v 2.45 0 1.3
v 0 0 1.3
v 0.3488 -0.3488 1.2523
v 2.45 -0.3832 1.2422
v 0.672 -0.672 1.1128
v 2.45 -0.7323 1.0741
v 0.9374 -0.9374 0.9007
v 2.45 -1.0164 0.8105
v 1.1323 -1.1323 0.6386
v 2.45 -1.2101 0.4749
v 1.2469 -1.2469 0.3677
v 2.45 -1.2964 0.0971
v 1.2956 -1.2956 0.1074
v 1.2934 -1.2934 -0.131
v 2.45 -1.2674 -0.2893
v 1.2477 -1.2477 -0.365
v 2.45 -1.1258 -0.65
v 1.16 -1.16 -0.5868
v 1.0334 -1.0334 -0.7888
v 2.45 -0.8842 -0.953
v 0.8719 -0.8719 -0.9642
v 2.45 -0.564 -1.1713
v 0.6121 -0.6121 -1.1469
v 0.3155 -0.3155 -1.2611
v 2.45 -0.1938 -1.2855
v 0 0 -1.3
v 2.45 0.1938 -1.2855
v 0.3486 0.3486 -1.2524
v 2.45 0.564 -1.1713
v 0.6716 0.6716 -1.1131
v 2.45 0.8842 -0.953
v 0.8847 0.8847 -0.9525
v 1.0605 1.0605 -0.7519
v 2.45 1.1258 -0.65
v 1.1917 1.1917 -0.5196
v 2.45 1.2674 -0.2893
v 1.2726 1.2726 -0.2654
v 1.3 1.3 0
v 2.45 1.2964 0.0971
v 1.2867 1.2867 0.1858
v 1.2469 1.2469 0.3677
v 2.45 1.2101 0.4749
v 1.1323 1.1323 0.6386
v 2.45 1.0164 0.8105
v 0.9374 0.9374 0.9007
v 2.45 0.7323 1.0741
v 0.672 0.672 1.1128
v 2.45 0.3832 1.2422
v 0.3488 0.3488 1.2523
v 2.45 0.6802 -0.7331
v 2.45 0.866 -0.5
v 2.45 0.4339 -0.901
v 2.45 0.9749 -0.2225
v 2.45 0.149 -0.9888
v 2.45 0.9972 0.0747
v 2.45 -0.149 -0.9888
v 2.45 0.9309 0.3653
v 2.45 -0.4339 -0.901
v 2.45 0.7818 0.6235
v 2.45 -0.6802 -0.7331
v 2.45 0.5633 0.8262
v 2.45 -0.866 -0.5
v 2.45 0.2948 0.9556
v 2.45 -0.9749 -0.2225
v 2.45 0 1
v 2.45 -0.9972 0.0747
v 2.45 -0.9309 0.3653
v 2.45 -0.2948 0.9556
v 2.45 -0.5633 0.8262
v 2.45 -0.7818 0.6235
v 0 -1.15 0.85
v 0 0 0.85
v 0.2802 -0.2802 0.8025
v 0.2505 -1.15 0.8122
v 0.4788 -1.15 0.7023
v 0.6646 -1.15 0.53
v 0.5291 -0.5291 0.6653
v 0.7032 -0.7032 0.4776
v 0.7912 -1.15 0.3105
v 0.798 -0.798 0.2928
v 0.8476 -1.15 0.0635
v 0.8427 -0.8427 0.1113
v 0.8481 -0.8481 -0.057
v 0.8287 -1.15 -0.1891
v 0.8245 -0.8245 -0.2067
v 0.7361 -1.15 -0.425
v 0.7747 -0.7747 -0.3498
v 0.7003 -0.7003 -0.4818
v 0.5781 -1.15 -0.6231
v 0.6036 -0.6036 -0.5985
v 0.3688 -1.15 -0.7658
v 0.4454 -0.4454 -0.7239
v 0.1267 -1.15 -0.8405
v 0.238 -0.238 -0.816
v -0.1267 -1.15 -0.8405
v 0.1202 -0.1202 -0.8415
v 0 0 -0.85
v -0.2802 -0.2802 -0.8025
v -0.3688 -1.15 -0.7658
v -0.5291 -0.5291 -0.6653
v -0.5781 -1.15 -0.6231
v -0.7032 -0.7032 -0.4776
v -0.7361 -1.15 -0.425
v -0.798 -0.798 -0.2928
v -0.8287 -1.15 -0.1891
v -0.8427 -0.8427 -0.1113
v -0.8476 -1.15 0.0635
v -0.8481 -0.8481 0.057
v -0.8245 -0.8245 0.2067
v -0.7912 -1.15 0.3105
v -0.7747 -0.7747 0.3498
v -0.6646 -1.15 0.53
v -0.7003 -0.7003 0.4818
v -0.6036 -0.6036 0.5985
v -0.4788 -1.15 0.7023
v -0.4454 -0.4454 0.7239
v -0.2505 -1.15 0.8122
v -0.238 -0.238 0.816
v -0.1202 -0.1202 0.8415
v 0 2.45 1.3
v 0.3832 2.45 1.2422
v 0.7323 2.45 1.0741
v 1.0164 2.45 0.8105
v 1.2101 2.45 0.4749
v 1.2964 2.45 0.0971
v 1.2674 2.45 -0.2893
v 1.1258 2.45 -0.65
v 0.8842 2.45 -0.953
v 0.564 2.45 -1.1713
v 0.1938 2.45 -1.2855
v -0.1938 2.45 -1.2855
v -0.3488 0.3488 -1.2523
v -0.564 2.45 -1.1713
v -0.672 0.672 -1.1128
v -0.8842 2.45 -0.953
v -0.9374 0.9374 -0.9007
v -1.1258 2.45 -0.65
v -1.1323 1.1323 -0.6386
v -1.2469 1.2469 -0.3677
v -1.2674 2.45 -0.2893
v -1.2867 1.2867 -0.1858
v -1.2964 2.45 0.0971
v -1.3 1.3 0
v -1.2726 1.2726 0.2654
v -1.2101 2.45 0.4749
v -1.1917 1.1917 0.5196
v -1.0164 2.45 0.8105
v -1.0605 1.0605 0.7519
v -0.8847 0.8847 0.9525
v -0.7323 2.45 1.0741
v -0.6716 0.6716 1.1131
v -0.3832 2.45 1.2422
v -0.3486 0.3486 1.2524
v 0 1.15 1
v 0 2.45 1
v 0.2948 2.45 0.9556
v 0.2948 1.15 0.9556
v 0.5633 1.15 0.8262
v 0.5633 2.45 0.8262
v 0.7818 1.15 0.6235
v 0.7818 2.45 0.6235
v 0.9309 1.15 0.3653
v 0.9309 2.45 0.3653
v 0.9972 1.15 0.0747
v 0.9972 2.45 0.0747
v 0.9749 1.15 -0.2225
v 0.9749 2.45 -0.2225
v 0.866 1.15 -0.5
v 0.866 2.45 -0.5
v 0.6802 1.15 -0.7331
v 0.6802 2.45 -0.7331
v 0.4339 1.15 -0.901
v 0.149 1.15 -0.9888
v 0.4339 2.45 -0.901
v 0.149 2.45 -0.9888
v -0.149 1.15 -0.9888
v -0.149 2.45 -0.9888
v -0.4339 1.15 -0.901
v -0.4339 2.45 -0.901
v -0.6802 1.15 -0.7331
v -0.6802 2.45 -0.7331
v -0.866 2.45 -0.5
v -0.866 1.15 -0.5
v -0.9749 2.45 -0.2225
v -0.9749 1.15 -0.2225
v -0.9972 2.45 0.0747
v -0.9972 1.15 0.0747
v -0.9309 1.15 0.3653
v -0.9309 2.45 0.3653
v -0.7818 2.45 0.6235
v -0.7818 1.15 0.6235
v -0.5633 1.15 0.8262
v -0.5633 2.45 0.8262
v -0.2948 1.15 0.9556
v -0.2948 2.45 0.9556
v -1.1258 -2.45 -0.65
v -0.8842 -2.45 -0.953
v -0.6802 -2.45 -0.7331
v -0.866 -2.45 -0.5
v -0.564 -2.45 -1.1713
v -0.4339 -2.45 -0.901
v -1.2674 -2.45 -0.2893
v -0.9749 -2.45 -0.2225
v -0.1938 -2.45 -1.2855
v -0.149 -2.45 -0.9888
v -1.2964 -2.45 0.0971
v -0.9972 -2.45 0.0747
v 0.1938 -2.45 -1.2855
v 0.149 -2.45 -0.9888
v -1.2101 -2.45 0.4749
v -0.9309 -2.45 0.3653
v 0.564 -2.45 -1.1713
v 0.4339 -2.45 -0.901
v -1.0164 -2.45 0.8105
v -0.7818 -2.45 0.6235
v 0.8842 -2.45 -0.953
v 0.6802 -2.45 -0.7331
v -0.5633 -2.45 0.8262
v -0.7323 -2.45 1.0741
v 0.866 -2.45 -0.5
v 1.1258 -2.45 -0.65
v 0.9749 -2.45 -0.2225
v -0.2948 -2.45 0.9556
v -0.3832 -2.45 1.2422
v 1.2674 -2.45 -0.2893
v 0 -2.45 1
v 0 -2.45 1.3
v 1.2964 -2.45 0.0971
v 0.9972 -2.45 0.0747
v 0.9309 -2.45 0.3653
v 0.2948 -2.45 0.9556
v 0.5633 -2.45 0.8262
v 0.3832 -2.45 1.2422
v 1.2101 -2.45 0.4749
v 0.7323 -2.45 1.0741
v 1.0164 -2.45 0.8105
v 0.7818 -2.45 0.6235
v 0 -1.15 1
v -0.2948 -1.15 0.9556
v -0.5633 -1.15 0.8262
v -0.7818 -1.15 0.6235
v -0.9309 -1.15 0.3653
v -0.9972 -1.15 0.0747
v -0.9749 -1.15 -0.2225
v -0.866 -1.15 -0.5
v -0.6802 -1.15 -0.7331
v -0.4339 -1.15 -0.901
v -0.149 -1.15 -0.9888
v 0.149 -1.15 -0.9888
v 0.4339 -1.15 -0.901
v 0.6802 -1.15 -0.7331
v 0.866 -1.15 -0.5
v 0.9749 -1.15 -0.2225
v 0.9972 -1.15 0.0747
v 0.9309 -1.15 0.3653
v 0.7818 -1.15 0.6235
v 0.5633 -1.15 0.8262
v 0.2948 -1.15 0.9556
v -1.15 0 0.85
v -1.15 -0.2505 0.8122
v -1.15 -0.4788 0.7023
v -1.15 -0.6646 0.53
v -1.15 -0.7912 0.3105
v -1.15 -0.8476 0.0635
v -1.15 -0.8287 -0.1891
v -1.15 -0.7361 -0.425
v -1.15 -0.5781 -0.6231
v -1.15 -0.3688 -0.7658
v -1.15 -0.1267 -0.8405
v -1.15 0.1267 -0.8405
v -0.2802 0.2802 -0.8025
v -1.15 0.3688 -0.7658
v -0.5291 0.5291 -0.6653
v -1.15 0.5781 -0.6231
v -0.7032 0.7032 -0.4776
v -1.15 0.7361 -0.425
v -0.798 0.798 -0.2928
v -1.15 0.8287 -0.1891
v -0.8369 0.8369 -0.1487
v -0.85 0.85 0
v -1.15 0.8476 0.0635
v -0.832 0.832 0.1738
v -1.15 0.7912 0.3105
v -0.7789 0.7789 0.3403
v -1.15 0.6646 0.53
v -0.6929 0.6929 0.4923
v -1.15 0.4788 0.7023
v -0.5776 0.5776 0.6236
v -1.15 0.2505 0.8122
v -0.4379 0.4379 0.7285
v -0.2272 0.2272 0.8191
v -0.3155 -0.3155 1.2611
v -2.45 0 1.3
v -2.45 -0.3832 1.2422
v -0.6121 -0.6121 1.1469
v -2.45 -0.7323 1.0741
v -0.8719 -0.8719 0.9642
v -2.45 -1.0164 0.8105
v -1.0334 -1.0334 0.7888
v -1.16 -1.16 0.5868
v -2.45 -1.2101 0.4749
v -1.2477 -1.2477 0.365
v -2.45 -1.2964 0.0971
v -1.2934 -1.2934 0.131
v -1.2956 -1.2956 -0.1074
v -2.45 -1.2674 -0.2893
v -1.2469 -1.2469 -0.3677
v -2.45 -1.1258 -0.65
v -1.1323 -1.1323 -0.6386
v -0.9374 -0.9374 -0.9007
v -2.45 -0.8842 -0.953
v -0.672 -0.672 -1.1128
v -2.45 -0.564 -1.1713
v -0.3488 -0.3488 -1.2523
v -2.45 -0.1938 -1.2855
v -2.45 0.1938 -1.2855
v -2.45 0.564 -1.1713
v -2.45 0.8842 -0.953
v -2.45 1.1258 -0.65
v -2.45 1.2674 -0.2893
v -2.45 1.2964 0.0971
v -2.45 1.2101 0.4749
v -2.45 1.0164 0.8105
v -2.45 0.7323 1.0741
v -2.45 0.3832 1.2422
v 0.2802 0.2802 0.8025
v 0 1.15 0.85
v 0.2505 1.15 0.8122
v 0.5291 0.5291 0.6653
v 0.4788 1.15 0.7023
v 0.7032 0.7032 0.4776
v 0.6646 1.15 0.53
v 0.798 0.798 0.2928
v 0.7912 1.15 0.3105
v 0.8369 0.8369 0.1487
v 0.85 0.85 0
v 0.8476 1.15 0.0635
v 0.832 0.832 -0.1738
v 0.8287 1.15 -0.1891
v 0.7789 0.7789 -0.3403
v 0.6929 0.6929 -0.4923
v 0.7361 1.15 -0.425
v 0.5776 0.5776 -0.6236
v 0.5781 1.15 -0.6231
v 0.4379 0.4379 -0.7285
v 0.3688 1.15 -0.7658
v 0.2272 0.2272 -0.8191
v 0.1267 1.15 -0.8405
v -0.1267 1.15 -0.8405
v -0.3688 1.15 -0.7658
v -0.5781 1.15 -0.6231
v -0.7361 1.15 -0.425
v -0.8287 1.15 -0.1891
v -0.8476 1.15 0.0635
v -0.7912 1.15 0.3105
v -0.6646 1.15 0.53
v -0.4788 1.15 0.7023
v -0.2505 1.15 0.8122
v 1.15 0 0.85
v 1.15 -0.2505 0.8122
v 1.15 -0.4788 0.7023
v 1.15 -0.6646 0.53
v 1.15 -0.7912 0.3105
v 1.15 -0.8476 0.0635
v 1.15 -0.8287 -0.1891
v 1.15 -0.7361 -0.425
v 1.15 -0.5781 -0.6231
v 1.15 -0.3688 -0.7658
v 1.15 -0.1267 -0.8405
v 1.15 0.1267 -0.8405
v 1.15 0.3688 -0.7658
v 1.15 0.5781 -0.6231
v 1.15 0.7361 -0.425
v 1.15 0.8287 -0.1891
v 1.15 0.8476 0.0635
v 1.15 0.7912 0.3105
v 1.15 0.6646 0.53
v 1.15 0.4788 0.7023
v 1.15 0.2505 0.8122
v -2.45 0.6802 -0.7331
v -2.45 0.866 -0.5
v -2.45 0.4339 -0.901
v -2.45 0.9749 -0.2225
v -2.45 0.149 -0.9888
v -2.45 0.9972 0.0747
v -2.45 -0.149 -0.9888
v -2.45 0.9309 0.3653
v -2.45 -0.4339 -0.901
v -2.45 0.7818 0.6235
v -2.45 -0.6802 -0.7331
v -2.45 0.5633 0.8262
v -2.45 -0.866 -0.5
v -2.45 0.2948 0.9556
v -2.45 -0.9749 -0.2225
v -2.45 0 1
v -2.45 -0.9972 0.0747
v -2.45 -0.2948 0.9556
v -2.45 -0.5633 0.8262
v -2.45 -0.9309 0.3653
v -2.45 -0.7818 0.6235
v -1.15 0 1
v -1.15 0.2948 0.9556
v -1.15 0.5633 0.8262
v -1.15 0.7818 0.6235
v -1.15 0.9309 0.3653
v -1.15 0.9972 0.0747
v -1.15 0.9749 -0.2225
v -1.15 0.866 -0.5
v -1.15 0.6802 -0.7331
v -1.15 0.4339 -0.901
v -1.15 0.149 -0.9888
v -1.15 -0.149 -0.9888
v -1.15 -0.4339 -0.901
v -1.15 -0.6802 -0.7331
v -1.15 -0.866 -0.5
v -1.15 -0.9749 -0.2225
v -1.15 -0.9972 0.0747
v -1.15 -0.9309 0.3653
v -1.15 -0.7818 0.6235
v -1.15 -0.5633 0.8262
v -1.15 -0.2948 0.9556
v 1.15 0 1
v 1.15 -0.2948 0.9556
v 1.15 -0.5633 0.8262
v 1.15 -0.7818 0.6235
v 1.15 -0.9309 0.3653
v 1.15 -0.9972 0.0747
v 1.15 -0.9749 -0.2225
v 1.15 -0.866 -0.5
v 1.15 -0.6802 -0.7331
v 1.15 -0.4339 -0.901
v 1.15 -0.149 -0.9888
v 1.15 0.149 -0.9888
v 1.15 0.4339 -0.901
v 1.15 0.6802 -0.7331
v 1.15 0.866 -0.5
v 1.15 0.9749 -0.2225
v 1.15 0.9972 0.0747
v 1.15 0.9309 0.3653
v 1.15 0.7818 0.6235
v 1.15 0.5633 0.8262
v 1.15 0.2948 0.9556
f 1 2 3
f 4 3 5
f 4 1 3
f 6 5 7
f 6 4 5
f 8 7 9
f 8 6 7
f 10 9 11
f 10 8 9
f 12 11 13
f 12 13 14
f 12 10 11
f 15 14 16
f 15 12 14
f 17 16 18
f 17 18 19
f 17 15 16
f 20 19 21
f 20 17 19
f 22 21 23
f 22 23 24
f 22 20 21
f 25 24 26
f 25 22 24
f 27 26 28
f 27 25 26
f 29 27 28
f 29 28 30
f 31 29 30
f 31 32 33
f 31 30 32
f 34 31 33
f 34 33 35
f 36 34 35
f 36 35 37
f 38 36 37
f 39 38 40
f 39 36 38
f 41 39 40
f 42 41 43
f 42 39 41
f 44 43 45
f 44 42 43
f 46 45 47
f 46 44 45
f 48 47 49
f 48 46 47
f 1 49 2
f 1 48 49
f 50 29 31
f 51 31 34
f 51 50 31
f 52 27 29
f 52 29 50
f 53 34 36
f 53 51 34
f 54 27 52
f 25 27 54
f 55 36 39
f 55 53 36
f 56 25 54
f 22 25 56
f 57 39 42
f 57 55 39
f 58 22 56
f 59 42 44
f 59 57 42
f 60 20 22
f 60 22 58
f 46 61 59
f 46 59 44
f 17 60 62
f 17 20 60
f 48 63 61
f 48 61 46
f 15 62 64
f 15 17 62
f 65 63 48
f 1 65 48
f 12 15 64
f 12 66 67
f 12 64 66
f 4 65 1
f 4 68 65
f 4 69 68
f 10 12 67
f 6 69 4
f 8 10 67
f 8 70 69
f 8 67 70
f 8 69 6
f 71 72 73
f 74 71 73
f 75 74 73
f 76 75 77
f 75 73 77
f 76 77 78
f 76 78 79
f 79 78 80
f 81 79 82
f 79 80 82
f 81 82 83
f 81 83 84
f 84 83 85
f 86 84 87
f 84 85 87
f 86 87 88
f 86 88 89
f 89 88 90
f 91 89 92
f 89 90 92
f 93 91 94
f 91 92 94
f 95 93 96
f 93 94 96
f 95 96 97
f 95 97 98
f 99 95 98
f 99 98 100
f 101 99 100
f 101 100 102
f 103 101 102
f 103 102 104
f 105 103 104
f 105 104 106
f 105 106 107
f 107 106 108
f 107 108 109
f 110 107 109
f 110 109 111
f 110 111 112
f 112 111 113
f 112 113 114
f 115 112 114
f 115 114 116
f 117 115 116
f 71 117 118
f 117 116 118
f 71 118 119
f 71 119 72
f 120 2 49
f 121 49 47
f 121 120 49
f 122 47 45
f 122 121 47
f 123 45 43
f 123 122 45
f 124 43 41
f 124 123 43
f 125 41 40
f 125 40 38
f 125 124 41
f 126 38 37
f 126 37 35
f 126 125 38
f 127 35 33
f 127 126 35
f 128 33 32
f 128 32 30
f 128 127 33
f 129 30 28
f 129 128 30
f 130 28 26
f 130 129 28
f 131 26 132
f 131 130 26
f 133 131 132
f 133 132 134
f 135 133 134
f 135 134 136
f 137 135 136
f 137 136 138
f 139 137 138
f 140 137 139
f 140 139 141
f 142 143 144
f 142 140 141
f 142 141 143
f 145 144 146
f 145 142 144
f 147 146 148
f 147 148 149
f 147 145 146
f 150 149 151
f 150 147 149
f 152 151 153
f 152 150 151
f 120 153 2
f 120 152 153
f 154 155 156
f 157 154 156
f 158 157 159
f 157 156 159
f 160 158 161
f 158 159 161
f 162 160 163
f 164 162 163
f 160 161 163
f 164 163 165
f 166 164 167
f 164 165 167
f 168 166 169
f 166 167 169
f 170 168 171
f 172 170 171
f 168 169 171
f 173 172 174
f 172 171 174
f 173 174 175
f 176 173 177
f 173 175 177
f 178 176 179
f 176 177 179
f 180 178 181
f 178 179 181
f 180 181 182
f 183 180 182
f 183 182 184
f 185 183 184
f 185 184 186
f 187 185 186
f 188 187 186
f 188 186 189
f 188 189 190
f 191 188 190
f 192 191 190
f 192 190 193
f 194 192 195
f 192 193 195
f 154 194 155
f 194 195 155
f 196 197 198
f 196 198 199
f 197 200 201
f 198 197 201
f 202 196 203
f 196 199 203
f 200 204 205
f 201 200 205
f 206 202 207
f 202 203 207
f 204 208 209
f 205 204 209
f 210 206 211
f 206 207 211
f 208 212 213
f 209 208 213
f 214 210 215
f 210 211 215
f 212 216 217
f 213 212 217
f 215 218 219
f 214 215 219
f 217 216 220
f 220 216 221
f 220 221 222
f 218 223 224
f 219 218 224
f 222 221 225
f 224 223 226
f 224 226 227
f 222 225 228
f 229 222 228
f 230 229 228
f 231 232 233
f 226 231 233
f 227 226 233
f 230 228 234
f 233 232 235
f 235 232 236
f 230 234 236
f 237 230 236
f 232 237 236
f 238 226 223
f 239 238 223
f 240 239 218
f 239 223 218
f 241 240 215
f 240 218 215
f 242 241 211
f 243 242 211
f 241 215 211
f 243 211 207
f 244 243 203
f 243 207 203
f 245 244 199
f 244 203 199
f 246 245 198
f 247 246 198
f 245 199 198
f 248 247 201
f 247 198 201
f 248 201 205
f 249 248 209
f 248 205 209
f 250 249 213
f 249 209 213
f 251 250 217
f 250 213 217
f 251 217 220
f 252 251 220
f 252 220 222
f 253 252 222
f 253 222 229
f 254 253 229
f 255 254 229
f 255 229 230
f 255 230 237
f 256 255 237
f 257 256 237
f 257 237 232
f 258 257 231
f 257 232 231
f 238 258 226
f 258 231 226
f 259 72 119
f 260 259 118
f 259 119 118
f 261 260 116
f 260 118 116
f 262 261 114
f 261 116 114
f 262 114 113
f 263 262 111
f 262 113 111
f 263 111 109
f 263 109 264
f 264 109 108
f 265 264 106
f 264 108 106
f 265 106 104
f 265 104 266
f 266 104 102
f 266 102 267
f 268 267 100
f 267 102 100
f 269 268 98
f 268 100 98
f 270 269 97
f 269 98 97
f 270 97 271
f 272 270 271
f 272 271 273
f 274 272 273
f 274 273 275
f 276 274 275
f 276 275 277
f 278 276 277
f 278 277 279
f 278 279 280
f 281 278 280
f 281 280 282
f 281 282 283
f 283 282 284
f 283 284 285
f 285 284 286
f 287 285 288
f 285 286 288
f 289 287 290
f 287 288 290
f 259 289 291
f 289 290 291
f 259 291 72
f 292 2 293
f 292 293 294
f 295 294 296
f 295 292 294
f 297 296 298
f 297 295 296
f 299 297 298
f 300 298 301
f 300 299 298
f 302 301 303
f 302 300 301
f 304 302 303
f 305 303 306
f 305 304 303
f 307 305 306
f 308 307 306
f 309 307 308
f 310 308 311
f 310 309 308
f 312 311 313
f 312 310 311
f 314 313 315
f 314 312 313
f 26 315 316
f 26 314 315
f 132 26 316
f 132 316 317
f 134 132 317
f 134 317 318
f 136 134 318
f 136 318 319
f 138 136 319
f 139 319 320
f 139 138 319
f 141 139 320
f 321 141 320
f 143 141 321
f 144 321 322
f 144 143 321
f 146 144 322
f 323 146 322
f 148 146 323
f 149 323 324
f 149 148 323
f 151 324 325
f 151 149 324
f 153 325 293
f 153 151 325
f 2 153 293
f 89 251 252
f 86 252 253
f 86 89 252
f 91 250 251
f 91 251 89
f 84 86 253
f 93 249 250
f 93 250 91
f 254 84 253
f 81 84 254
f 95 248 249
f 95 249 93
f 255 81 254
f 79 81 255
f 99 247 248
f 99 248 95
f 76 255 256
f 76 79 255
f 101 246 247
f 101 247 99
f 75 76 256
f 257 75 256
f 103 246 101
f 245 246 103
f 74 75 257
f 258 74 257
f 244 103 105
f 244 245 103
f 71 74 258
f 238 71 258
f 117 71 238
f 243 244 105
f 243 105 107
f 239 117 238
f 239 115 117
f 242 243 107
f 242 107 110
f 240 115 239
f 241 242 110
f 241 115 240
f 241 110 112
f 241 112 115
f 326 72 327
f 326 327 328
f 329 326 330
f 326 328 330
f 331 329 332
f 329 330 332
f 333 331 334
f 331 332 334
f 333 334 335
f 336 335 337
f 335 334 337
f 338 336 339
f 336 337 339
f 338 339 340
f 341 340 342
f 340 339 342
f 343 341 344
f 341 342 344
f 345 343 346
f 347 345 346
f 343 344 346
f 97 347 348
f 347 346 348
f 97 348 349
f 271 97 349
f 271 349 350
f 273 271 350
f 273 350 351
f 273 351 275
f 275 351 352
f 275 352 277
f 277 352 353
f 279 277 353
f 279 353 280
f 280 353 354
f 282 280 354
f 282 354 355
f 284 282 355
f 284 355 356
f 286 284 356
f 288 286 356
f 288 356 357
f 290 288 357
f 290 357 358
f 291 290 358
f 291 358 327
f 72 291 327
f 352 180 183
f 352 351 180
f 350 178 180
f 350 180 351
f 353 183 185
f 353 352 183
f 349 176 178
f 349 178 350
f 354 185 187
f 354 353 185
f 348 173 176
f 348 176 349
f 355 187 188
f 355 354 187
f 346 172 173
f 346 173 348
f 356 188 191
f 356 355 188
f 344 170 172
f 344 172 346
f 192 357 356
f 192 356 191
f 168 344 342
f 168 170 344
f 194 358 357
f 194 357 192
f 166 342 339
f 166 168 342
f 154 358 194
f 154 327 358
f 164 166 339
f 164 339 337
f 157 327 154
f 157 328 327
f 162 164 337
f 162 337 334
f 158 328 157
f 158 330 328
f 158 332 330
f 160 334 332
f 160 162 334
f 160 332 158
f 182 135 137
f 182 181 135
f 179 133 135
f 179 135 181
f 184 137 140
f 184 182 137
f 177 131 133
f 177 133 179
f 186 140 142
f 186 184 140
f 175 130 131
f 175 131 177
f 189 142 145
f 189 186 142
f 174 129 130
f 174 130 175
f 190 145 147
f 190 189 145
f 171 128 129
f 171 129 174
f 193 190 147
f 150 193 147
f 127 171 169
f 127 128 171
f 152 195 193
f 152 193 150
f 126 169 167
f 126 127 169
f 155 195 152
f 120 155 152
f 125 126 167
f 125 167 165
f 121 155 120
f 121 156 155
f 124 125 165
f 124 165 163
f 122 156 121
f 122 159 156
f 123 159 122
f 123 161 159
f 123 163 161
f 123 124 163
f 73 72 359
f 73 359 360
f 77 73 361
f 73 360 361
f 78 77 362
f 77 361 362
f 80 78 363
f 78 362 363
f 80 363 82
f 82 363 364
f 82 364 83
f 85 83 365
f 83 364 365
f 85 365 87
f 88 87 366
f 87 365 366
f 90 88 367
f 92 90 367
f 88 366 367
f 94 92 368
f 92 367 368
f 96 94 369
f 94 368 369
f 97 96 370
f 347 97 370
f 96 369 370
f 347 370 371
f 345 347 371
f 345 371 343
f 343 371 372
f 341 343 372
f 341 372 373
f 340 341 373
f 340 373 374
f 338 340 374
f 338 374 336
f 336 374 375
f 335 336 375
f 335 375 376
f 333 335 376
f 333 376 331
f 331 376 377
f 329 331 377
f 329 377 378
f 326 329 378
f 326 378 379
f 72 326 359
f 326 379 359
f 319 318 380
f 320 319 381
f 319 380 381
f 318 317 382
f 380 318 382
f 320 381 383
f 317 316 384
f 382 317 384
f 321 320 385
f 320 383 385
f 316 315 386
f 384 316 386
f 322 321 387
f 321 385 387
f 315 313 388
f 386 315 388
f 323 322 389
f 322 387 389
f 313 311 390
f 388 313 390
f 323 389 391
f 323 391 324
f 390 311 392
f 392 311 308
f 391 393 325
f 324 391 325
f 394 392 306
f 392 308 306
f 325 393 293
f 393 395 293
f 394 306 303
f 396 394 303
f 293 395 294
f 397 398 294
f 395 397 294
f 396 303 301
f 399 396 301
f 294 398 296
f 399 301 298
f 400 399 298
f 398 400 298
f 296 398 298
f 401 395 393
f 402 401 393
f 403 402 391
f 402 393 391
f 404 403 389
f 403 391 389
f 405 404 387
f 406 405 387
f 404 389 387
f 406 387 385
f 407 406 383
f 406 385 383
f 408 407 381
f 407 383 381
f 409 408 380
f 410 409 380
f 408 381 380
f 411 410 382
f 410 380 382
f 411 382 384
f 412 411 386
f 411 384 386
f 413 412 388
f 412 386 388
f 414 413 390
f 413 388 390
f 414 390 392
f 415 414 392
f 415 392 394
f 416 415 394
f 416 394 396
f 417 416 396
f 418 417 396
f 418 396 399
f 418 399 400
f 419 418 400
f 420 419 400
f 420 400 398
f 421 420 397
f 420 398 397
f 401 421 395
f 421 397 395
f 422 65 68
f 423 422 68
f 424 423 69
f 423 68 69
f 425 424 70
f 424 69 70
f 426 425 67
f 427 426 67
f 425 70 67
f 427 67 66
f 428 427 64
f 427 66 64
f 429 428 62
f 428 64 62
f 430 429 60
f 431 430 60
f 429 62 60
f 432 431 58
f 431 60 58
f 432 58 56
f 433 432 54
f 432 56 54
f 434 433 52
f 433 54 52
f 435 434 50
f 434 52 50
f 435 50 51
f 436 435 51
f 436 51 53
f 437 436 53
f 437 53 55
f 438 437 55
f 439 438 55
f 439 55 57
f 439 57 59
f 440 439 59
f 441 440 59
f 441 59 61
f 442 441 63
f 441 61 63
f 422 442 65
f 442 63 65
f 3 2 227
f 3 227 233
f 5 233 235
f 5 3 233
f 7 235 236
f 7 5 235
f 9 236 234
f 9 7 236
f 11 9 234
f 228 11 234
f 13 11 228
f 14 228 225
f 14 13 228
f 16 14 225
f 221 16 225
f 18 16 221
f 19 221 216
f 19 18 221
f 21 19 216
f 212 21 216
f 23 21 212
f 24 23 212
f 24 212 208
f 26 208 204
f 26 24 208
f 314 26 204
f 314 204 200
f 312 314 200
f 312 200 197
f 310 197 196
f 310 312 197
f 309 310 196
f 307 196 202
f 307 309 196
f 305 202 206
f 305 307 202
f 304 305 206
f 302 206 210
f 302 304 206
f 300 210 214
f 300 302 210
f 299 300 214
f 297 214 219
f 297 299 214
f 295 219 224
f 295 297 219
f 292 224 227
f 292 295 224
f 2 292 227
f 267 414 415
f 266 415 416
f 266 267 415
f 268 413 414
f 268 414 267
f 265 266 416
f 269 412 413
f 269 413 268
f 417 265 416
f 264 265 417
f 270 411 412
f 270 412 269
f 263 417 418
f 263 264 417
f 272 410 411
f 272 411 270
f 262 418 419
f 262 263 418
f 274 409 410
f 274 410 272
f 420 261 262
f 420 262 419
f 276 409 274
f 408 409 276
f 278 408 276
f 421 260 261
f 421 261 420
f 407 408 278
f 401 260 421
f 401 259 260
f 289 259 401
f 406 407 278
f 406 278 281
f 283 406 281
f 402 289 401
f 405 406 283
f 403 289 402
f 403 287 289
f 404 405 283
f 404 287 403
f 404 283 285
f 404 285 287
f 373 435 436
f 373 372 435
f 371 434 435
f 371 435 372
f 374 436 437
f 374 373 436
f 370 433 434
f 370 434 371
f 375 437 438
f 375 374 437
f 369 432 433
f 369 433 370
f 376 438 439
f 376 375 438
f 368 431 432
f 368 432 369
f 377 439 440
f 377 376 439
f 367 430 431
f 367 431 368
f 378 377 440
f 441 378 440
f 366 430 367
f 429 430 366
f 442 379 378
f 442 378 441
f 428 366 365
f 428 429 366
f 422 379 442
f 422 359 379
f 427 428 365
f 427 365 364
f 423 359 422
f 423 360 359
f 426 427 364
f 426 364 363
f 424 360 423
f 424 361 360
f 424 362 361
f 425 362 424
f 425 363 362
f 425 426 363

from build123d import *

# Parameters (mm, degrees)
SKETCH1_R           = 26
BOSS_EXTRUDE1_DEPTH = 49
CIRPATTERN1_COUNT   = 2
CIRPATTERN1_ANGLE   = 90
SKETCH2_R           = 20
CUT_EXTRUDE1_DEPTH  = 26
CIRPATTERN2_COUNT   = 4
SKETCH3_R           = 17
CUT_EXTRUDE2_DEPTH  = 91.890043459
CIRPATTERN3_COUNT   = 2
CIRPATTERN3_ANGLE   = 90
SCALE1_SCALE        = 0.2
SCALE2_SCALE        = 0.25


with BuildPart() as part:
    # Sketch1 → Boss-Extrude1 (new, symmetric)
    with BuildSketch(Plane(origin=(0, 0, 0), x_dir=(1, 0, 0), z_dir=(0, 1, 0))):
        Circle(SKETCH1_R)
    boss_extrude1 = extrude(amount=BOSS_EXTRUDE1_DEPTH, both=True)

    # CirPattern1: Boss-Extrude1 ×2 about axis
    cirpattern1_axis = Axis((0, 0, 50), (0, 0, -1))
    for i in range(1, CIRPATTERN1_COUNT):
        add(boss_extrude1.rotate(cirpattern1_axis, i * CIRPATTERN1_ANGLE / (CIRPATTERN1_COUNT - 1)))

    # Sketch2 → Cut-Extrude1 (cut)
    with BuildSketch(Plane(origin=(0, 49, 0), x_dir=(1, 0, 0), z_dir=(0, 1, 0))):
        Circle(SKETCH2_R)
    cut_extrude1 = extrude(amount=-CUT_EXTRUDE1_DEPTH, mode=Mode.SUBTRACT)

    # CirPattern2: Cut-Extrude1 ×4 about axis
    cirpattern2_axis = Axis((0, 0, 50), (0, 0, -1))
    for i in range(1, CIRPATTERN2_COUNT):
        add(cut_extrude1.rotate(cirpattern2_axis, i * 360 / CIRPATTERN2_COUNT), mode=Mode.SUBTRACT)

    # Sketch3 → Cut-Extrude2 (cut, through all)
    with BuildSketch(Plane(origin=(0, 23, 0), x_dir=(1, 0, 0), z_dir=(0, 1, 0))):
        Circle(SKETCH3_R)
    cut_extrude2 = extrude(amount=-CUT_EXTRUDE2_DEPTH, mode=Mode.SUBTRACT)

    # CirPattern3: Cut-Extrude2 ×2 about axis
    cirpattern3_axis = Axis((0, 0, 50), (0, 0, -1))
    for i in range(1, CIRPATTERN3_COUNT):
        add(cut_extrude2.rotate(cirpattern3_axis, i * CIRPATTERN3_ANGLE / (CIRPATTERN3_COUNT - 1)), mode=Mode.SUBTRACT)


with BuildPart() as part_1:
    # Scale1: scaled about (0, 0, 0)
    add(part.part.scale(SCALE1_SCALE))


with BuildPart() as part_2:
    # Scale2: scaled about (0, 0, 0)
    add(part_1.part.scale(SCALE2_SCALE))


solid = part_2.part
